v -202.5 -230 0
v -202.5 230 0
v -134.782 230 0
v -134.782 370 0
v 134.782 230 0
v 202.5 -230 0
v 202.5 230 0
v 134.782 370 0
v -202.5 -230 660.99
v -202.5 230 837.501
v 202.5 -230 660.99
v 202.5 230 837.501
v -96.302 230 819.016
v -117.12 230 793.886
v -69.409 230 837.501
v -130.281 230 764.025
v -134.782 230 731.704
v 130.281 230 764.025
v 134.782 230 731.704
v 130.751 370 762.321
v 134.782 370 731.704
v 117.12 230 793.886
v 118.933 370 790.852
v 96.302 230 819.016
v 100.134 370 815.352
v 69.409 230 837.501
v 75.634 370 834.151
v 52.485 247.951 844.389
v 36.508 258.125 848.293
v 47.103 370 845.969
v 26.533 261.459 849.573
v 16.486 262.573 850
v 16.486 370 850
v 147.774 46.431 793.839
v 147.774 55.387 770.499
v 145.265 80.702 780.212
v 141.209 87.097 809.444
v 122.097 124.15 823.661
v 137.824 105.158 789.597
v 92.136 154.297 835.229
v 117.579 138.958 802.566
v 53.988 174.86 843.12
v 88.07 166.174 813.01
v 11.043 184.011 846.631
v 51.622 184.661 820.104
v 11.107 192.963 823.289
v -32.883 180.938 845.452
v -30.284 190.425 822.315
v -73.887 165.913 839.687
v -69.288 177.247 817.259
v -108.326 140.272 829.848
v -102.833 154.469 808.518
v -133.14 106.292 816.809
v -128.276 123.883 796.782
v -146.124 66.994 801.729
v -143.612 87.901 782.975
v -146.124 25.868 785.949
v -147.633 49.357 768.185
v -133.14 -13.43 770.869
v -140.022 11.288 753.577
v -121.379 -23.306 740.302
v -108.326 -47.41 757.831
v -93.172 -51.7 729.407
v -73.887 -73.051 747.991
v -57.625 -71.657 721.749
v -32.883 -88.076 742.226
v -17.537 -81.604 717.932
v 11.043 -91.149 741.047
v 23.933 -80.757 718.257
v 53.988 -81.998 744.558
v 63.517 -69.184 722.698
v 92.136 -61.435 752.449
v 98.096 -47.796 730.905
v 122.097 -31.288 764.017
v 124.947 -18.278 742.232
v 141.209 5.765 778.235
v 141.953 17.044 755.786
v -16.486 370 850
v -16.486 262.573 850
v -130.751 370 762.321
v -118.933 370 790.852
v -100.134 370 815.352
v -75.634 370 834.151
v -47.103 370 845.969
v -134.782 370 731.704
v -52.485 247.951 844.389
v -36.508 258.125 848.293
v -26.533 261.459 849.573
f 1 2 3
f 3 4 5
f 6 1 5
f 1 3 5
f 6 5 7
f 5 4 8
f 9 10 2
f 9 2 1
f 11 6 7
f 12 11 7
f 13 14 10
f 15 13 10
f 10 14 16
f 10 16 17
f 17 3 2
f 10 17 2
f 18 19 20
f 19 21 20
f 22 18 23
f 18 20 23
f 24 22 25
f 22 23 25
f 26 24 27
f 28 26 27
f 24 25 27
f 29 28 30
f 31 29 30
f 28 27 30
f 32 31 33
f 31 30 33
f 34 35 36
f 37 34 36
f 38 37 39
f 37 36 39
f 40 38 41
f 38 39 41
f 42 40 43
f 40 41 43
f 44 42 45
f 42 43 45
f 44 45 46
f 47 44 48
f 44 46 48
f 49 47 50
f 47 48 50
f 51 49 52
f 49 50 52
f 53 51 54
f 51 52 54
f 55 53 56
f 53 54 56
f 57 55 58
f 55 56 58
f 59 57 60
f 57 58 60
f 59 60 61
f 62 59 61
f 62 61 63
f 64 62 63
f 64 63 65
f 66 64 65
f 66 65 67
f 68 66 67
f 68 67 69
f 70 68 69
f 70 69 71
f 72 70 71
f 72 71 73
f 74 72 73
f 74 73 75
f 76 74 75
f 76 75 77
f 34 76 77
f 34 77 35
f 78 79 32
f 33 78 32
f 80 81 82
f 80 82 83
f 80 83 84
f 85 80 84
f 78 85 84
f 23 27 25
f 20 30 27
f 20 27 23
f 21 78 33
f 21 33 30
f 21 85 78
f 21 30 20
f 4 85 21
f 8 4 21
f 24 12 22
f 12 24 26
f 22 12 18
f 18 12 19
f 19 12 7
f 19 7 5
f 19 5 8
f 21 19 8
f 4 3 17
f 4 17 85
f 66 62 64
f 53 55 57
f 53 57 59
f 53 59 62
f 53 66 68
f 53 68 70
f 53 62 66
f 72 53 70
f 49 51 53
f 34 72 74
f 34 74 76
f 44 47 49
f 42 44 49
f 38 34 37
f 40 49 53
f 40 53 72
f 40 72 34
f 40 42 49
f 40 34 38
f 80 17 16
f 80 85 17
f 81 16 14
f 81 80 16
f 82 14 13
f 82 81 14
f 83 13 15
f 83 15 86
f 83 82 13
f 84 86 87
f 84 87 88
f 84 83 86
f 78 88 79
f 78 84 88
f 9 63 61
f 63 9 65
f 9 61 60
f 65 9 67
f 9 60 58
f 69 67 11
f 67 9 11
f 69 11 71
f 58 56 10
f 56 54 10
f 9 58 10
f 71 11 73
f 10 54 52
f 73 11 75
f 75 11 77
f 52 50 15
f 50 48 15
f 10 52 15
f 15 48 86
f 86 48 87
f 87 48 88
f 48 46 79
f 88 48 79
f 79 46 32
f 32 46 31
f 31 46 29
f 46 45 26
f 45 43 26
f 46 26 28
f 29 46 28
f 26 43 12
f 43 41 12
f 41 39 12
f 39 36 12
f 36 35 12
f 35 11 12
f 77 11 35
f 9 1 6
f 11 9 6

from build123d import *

# Parameters (mm, degrees)
F0_W     = 269.564176
F0_H     = 140
F1_DEPTH = 850
F3_DEPTH = 405.001
F4_R     = 118.296465
F5_R     = 147.774344
F6_DEPTH = 25


with BuildPart() as f1:
    # F0 (on Top) → F1 (new body)
    with BuildSketch(Plane.XY):
        Polygon((202.5, -230), (202.5, 230), (134.782088, 230), (-134.782088, 230), (-202.5, 230), (-202.5, -230), align=None)
        with Locations((0, 300)):
            Rectangle(F0_W, F0_H)
    extrude(amount=F1_DEPTH)

    # F2 (on face) → F3 (cut, through all)
    with BuildSketch(Plane.YZ.offset(202.5)):
        Polygon((-312.20004, 629.447699), (364.741862, 889.204443), (-312.20004, 956.11155), align=None)
    extrude(amount=-F3_DEPTH, mode=Mode.SUBTRACT)

    # F4
    f4_edges = [f1.edges().sort_by_distance(p)[0] for p in [
        (134.782088, 316.286348, 850),
        (-134.782088, 316.286348, 850),
    ]]
    fillet(f4_edges, radius=F4_R)

    # F5 (on face) → F6 (join)
    with BuildSketch(Plane(origin=(0, -250.602024, 653.084144), x_dir=(1, 0, 0), z_dir=(0, -0.358251, 0.933625))):
        with Locations((0, 327.743053)):
            Circle(F5_R)
    extrude(amount=F6_DEPTH)


solid = f1.part
